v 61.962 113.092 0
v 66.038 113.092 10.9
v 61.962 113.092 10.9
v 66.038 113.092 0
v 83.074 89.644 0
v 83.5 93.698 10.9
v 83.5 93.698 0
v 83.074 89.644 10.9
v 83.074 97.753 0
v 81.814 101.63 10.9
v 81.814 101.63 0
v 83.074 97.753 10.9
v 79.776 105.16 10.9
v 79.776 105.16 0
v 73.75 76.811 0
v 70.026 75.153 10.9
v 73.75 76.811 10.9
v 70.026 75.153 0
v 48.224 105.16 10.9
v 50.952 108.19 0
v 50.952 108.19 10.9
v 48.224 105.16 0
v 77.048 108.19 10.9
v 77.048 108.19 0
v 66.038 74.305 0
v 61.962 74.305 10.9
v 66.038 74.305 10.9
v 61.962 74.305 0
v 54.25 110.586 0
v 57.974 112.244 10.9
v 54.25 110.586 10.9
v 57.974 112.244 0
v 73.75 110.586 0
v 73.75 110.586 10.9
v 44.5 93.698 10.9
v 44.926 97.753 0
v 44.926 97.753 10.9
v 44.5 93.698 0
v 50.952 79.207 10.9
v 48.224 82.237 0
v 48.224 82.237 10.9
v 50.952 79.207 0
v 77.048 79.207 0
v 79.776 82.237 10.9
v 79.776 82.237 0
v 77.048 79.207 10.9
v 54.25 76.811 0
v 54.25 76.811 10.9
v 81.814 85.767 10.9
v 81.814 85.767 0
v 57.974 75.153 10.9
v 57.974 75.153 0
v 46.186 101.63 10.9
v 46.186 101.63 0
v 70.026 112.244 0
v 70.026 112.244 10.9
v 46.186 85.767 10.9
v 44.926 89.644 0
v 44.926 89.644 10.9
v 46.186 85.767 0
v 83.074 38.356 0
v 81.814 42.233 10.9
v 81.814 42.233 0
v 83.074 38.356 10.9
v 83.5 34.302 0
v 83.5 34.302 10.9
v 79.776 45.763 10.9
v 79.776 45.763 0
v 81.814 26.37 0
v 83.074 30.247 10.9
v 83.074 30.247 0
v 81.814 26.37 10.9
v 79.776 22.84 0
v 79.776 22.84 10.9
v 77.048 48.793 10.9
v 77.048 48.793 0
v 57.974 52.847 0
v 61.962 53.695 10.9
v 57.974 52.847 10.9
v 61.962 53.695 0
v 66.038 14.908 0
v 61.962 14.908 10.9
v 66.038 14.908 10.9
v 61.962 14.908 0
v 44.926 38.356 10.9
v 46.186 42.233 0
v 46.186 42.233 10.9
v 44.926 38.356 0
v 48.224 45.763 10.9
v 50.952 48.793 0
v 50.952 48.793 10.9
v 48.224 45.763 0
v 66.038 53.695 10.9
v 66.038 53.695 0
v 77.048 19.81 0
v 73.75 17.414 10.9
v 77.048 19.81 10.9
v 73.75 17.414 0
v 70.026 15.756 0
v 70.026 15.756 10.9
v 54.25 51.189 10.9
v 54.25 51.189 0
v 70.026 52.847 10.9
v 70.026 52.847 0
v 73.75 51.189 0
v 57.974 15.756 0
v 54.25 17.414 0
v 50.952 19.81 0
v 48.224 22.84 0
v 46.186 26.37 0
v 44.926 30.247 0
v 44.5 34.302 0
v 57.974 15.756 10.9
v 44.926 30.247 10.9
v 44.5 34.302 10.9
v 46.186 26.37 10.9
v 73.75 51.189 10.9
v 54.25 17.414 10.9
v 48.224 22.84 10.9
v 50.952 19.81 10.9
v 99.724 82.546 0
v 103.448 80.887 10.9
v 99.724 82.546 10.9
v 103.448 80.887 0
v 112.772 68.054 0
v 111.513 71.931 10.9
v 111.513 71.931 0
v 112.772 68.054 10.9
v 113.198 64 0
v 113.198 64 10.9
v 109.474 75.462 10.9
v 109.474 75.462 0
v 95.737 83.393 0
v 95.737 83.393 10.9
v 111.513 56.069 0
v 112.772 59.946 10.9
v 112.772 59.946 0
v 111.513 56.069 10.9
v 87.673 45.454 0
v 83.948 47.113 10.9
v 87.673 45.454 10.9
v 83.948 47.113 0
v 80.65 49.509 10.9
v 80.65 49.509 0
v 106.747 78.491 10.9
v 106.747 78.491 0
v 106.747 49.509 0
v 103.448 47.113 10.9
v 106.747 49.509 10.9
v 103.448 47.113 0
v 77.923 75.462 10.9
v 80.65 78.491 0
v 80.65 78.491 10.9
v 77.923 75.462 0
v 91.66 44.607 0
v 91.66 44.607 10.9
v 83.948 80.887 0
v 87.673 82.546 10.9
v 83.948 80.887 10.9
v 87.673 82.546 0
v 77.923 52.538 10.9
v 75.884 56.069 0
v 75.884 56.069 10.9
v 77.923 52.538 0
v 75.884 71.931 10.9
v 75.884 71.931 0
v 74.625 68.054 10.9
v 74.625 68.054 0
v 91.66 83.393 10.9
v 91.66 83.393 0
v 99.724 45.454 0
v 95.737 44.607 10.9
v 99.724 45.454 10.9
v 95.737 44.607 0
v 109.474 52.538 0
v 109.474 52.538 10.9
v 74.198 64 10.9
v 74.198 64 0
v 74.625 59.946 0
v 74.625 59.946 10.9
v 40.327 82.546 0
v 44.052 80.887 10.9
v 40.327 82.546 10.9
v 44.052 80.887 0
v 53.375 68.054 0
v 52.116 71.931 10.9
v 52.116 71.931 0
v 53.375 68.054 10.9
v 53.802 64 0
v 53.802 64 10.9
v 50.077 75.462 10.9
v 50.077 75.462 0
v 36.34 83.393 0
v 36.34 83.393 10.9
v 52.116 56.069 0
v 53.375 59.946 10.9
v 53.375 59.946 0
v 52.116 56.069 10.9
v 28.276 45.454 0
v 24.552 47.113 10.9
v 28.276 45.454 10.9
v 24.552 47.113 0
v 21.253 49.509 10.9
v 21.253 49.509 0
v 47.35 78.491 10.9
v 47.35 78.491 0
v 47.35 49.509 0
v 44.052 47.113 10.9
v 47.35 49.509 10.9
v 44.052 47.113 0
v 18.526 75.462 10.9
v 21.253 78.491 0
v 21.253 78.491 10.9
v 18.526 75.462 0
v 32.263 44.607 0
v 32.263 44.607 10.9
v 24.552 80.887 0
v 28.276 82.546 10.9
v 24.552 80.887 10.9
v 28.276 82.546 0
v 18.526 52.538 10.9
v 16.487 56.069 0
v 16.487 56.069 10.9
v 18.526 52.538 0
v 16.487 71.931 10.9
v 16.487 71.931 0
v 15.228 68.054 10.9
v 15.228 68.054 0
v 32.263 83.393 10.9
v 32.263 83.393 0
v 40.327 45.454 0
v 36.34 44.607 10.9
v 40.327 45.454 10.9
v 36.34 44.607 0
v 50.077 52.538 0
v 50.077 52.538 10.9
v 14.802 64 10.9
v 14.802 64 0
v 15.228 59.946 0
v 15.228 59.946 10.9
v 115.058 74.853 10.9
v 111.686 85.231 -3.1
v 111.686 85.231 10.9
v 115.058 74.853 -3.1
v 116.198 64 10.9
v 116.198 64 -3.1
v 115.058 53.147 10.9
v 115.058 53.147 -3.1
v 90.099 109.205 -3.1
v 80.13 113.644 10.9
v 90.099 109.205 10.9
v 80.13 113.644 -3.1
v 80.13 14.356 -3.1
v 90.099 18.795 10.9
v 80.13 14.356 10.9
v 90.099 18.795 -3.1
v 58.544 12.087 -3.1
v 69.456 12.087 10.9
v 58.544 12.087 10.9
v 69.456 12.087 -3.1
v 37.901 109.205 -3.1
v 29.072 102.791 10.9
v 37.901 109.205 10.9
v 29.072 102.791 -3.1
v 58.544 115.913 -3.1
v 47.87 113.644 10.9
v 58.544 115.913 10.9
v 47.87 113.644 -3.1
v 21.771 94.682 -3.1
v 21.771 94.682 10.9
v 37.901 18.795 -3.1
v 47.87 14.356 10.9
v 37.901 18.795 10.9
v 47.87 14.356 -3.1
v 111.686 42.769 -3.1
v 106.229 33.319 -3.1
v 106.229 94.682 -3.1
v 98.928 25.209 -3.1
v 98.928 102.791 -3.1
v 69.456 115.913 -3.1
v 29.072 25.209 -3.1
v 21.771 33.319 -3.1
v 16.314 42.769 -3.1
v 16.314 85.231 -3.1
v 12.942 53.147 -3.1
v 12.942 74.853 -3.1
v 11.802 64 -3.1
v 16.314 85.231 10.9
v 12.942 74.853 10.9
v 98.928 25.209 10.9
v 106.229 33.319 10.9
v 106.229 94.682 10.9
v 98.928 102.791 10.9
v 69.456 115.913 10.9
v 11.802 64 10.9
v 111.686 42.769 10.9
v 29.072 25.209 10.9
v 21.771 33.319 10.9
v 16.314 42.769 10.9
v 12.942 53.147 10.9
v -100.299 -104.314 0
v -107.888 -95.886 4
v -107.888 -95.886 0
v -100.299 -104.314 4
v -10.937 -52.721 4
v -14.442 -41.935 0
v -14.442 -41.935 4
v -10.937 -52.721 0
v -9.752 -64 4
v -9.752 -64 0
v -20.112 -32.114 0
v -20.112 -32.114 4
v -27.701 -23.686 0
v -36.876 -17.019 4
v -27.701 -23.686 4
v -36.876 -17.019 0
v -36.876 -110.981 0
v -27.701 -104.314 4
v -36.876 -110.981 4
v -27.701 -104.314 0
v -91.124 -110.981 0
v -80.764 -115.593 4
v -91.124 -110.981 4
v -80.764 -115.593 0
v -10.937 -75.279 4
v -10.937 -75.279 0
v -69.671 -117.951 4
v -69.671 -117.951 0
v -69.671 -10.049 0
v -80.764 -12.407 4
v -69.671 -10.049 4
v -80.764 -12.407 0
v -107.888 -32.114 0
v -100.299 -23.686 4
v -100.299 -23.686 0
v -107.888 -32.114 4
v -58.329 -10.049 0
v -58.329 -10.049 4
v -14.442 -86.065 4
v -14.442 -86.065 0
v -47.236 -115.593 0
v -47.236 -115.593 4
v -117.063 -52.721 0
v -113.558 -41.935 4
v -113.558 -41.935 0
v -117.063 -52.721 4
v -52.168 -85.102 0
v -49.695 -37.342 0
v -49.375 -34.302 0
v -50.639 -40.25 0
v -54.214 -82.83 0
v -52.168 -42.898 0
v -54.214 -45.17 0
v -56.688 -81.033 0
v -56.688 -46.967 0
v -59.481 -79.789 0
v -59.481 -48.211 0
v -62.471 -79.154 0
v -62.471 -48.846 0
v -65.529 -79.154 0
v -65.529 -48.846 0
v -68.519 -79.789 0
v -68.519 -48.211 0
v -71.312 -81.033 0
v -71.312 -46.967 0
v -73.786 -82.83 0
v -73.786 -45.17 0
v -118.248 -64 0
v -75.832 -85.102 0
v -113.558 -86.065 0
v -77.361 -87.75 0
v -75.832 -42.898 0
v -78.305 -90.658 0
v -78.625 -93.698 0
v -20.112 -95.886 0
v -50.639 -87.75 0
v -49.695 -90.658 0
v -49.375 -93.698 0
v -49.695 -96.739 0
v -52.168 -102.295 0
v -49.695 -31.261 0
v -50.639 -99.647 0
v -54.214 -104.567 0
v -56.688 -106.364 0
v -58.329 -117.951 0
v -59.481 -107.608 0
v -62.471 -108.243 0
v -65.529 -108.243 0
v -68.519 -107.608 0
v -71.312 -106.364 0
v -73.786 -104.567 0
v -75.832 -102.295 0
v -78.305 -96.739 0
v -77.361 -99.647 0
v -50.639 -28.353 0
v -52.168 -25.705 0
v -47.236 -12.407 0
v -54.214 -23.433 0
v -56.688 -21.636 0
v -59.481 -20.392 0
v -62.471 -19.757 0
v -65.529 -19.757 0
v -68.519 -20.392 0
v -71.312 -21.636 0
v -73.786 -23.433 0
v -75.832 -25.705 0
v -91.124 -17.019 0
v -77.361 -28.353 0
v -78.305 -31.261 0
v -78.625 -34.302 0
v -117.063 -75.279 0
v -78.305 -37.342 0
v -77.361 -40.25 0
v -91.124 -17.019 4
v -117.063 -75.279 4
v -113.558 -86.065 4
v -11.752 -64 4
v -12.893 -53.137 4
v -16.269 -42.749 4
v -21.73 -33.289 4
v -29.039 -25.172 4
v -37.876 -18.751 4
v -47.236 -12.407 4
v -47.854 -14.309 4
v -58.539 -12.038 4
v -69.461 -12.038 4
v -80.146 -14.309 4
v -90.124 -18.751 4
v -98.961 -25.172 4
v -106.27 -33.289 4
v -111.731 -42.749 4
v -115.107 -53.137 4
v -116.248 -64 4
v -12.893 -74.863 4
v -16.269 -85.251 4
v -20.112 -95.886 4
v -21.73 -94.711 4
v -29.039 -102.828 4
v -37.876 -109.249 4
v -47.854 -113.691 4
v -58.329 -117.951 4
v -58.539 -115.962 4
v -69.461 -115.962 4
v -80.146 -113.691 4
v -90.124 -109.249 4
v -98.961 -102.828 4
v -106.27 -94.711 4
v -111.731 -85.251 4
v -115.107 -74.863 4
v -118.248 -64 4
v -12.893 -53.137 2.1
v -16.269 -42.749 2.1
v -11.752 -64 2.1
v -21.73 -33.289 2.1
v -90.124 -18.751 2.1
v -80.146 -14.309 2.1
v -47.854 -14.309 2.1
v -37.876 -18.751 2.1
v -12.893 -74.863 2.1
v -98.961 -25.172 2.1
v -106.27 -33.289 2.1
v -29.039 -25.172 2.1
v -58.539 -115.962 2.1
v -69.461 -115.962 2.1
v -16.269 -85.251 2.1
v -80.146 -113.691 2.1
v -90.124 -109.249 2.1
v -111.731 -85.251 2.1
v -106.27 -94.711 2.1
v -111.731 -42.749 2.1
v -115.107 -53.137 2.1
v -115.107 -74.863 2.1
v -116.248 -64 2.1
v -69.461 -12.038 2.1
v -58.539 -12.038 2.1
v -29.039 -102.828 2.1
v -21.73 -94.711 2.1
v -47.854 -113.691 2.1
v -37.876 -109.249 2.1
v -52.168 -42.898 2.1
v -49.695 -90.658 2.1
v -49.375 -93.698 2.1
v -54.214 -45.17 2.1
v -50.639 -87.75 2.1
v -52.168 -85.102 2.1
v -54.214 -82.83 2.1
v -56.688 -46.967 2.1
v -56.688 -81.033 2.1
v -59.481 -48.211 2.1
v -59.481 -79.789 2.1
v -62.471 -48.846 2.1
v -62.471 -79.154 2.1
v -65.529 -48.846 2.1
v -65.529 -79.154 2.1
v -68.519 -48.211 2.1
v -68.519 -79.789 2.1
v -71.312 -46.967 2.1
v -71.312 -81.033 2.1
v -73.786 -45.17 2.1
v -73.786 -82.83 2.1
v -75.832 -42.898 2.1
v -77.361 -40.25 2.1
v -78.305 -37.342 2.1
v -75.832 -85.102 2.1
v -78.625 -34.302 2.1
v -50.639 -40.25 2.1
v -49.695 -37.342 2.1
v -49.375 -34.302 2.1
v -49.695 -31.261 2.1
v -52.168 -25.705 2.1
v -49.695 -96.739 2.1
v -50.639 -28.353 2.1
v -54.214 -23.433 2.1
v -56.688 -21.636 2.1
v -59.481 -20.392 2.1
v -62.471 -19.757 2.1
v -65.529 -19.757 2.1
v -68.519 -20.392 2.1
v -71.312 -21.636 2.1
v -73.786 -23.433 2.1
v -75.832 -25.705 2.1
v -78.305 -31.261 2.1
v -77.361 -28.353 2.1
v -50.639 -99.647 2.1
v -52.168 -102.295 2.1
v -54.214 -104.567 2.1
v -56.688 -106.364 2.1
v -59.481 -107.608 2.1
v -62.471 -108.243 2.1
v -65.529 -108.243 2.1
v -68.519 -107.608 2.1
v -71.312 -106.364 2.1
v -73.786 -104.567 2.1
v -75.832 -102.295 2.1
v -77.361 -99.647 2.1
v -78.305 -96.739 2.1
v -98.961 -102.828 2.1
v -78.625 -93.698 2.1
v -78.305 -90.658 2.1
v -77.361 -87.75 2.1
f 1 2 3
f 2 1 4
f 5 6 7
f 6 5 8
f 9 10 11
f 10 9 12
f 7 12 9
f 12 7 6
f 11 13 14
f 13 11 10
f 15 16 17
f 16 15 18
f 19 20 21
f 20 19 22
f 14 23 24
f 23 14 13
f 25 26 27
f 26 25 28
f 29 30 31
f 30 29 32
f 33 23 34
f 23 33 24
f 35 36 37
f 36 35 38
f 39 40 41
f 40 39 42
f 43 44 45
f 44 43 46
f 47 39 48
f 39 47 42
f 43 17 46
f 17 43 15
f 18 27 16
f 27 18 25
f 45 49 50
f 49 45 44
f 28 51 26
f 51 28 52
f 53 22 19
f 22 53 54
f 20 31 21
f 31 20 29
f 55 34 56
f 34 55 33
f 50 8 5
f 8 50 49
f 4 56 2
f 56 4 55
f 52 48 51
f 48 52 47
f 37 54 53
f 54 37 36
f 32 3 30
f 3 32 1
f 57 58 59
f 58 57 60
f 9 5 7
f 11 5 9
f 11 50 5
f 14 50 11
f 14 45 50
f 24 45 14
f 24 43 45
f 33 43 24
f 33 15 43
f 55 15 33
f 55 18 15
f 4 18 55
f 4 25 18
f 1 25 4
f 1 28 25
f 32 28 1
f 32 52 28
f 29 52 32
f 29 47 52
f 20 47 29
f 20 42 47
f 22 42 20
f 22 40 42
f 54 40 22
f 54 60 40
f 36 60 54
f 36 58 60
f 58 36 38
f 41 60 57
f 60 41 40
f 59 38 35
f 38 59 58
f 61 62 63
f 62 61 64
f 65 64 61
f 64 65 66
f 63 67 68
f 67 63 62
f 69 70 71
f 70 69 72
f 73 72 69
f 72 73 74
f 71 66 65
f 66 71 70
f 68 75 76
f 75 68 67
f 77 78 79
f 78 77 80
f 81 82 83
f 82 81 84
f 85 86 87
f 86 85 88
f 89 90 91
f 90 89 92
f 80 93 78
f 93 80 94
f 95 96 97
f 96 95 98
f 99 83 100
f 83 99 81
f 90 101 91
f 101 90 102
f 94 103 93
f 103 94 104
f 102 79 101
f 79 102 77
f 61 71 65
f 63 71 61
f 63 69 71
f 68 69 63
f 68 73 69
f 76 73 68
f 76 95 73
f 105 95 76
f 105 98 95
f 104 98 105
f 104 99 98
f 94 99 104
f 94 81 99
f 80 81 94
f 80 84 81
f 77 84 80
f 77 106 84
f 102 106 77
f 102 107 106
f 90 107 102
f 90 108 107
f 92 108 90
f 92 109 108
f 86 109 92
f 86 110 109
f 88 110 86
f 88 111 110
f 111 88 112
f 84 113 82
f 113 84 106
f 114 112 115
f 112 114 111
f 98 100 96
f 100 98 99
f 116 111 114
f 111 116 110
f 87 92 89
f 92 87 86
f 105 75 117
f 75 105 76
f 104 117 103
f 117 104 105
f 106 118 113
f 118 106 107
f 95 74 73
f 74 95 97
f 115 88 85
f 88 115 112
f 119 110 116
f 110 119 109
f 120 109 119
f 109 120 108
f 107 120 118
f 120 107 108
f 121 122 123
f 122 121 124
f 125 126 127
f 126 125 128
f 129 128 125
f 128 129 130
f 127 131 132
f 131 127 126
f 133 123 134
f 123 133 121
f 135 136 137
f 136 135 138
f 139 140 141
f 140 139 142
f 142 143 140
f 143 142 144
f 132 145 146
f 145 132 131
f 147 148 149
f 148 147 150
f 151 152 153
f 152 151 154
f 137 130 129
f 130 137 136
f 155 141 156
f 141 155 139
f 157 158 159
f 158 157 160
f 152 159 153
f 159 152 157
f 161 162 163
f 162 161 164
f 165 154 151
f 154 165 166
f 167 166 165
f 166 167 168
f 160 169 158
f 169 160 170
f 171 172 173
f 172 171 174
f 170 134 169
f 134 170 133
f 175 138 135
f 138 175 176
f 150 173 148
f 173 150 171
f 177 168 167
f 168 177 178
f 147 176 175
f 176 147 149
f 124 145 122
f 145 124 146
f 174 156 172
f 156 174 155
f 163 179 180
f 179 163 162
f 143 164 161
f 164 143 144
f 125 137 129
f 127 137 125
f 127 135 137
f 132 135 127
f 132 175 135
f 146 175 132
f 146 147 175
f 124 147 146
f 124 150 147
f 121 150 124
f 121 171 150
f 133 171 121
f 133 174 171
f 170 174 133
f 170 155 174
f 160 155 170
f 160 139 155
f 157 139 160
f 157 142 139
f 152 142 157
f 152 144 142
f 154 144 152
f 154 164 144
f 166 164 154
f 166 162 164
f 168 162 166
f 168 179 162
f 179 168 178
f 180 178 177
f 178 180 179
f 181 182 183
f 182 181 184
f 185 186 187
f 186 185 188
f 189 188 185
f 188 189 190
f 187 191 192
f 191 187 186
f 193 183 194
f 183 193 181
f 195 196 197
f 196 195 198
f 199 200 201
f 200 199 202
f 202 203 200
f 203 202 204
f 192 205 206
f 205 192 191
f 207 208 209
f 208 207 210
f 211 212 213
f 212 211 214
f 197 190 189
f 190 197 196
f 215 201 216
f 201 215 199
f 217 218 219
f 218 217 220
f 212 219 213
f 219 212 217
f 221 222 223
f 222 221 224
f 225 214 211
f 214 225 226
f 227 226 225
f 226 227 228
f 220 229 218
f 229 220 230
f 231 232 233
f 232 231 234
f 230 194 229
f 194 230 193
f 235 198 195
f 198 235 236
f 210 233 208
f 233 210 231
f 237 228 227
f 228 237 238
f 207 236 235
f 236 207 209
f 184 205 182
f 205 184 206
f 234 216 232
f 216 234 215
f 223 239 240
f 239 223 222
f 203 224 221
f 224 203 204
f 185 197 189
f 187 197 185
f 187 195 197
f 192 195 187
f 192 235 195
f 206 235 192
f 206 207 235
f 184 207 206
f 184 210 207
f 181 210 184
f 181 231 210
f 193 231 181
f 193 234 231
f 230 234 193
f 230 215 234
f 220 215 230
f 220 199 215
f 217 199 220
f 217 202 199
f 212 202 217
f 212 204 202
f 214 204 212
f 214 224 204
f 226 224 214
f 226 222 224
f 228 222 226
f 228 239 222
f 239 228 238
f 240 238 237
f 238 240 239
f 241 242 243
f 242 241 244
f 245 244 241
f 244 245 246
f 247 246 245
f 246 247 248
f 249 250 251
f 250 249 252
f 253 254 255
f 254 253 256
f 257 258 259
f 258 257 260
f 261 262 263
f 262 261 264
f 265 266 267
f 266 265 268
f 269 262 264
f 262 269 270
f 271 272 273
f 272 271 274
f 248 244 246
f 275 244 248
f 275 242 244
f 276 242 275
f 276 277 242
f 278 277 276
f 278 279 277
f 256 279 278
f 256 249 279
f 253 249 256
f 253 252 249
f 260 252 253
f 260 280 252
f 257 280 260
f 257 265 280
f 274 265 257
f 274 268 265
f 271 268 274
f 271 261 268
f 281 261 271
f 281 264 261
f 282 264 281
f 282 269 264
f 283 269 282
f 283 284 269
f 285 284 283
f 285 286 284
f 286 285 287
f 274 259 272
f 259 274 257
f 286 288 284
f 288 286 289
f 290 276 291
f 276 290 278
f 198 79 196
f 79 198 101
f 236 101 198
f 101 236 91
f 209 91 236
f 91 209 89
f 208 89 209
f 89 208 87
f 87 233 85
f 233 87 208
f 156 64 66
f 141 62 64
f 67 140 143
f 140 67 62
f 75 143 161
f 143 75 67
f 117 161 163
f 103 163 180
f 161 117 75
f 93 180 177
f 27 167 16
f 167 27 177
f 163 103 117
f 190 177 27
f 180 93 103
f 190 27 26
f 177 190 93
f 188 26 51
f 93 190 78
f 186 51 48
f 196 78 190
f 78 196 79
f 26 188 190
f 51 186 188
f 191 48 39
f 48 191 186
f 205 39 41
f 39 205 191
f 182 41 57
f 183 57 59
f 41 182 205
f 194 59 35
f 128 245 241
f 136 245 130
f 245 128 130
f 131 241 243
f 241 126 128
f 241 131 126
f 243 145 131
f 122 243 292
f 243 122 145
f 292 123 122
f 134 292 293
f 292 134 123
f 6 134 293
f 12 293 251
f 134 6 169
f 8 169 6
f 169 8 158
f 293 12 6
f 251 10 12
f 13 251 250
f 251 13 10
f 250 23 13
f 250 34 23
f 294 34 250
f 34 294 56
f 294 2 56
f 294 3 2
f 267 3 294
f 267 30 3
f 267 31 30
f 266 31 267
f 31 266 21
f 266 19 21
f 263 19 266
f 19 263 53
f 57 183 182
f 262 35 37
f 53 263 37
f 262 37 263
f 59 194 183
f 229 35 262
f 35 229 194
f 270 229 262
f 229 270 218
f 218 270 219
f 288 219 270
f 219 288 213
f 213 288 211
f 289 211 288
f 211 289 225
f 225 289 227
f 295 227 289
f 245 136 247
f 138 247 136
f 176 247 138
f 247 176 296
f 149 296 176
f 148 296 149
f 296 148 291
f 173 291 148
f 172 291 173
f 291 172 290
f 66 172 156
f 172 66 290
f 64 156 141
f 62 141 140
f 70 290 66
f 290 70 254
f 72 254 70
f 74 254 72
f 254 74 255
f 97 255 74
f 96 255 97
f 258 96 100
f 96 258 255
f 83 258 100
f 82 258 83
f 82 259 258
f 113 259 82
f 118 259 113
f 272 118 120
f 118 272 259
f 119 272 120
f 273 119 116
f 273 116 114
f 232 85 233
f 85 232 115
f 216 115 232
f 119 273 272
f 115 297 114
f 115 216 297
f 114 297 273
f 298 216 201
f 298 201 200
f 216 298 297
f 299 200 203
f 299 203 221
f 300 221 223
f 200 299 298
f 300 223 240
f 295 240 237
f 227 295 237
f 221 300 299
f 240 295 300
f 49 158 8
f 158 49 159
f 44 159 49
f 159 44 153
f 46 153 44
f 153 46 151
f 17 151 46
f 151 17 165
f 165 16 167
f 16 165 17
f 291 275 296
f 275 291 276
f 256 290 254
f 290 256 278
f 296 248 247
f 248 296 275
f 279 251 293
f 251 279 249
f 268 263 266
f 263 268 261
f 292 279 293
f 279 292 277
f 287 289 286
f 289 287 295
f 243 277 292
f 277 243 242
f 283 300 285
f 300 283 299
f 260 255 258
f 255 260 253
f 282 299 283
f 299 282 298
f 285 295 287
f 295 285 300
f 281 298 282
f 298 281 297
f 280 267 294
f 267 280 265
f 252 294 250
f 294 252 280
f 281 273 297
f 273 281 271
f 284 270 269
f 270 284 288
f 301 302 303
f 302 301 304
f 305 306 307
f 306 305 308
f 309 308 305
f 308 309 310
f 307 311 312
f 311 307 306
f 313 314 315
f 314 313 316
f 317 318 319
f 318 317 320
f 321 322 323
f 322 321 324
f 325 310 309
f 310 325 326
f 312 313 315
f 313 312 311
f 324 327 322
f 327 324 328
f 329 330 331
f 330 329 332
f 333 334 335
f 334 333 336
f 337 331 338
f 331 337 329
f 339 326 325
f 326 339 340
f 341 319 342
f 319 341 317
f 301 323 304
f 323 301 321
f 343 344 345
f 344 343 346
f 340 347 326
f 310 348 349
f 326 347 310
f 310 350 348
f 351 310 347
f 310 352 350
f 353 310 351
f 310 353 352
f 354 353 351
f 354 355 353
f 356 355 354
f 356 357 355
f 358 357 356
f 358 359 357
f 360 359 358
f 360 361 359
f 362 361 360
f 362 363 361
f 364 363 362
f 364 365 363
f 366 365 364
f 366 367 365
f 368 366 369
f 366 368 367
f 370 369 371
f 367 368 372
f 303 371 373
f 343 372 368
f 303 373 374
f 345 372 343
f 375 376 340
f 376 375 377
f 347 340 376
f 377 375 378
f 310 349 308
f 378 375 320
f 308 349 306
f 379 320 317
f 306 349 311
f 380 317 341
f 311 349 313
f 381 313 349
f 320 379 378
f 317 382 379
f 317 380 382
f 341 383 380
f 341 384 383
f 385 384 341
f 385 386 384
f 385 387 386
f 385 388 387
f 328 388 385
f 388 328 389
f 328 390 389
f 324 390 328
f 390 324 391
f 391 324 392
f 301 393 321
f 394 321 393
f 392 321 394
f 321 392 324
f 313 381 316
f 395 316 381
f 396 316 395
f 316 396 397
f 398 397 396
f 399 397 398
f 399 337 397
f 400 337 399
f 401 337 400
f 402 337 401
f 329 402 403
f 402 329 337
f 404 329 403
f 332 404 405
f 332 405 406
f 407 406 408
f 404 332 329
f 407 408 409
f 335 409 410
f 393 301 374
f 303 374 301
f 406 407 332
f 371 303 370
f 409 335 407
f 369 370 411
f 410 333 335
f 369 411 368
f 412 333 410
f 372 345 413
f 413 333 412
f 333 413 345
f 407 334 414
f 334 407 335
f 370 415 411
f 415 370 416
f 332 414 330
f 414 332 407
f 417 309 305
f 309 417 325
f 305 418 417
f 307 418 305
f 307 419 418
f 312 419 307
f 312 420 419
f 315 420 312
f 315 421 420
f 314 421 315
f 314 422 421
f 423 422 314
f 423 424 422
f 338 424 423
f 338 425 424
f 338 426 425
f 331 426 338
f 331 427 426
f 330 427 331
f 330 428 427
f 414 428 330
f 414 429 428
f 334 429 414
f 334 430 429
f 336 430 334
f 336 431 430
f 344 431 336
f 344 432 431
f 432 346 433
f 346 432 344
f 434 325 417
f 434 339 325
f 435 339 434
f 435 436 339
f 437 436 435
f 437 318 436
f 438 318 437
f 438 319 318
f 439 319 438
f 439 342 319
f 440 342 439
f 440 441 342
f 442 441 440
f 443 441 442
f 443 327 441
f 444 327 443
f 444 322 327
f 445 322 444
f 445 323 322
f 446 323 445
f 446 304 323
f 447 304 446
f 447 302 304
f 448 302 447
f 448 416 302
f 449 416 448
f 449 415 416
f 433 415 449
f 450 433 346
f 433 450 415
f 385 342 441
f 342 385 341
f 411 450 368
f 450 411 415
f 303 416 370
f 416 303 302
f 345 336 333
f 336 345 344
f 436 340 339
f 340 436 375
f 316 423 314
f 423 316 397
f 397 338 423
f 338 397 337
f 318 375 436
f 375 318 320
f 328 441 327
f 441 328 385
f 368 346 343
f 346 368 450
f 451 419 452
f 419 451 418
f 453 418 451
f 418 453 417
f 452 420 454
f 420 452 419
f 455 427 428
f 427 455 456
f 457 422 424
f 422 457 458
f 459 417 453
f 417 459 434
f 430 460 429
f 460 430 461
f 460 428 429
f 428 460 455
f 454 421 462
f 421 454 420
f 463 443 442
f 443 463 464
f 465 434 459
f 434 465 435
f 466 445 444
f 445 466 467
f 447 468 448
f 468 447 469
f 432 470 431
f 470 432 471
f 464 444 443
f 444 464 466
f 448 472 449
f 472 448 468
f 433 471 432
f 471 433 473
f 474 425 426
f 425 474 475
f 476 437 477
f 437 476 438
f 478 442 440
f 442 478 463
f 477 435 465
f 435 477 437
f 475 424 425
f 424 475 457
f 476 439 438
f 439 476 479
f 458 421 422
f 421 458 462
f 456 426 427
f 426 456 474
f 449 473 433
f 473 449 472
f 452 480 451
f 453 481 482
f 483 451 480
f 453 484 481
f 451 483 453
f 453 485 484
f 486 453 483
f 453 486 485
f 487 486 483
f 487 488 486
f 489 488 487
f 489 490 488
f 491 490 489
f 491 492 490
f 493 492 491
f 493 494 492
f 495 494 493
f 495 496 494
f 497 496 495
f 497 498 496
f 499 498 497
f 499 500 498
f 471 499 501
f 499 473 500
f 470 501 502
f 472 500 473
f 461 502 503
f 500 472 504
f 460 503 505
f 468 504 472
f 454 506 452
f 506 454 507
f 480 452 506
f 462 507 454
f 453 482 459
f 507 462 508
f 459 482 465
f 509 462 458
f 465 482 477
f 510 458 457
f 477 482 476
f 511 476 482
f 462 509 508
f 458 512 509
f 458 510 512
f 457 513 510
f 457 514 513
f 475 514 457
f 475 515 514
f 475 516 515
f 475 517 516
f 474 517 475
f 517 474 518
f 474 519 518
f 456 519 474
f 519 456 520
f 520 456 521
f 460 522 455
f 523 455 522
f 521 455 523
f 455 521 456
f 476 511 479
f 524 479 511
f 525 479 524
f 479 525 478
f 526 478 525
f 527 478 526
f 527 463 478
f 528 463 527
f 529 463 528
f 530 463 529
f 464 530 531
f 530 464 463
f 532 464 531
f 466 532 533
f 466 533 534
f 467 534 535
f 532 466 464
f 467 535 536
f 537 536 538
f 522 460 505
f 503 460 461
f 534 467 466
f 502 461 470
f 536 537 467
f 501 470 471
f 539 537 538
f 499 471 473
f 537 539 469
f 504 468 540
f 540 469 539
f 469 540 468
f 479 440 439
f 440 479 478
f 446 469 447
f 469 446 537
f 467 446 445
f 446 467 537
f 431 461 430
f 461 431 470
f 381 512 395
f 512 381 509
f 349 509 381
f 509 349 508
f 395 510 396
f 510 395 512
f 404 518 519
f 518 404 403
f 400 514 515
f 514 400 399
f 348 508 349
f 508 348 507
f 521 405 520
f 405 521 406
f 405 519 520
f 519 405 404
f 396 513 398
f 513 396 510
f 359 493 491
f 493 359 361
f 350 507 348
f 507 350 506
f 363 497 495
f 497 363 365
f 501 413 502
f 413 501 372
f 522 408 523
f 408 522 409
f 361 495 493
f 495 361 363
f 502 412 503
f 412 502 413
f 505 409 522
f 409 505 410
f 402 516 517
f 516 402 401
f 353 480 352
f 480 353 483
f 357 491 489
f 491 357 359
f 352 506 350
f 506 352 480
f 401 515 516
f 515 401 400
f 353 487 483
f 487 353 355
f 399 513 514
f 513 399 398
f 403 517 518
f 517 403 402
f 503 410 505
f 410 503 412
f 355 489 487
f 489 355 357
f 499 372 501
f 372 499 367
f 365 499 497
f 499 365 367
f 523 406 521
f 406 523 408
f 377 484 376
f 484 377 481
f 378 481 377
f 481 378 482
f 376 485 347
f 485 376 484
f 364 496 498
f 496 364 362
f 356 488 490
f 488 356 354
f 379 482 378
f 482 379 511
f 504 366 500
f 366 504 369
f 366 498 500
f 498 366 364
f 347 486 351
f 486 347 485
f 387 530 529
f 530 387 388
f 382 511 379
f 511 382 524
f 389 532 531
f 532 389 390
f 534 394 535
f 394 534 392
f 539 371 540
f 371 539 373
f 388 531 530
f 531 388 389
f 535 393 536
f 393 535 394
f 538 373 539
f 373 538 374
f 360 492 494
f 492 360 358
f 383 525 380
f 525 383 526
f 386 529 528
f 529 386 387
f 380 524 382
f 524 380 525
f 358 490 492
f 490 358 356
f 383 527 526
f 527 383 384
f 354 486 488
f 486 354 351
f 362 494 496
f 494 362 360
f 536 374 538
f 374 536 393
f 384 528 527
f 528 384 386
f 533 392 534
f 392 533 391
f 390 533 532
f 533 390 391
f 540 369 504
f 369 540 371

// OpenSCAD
// dist units: mm

//whole config
parts_sep = 64; // how much to separate the top and base
eps =0.1; // nudge amount



//base config
well_dia = 39; // diameter of the food well. Currently set to contain a 3.5 cm petri dish & allow for a 3.8 cm cover to be added while in well
well_rad = well_dia/2; // r: radius of the food well
well_depth=11; // depth of the food well. Currently set to fit flush against the top of a 1.1 cm petri dish.
wall_thick = 3; // wt: wall thickness between wells
bottom_thick = wall_thick; // the thickness of the bottom of the disk

//top config
pit_dia = (2+2*sqrt(2.0))*well_rad + (2+sqrt(2.0))*wall_thick+ eps; // pd: size of the hole the base will fit into (ie, base diameter nudged)
lip_thick = 2; // lt: how far past the base does the lip extend?
lip_overhang = 2; // lo: how far down the base does the lip extend?
lid_thick = 2; // dt: how thick is the lid?
rad_cont = 0.75; // rc: how much smaller is the entry port than the well?


// define a well
module well(x,y,d,r){
     translate([x,y,0]) cylinder(r=r, h=d);//, center=true) ;
}

// define four evenly spaced wells
module allswell(d,r, wt){
    cntr = (r + wt/2)*sqrt(2.0); // calculate the centering coord
    well(0,cntr,d,r);
    well(0,-cntr,d,r);
    well(cntr,0,d,r);
    well(-cntr,0,d,r);
}

// define the Big Disk holding the wells
module metawell(d, r, wt, bt){

    translate([0,0,-(bt+eps)]) cylinder(d=(2+2*sqrt(2.0))*r + (2+sqrt(2.0))*wt , h=d+bt) ;

    }




//well(0,0,well_depth, well_rad);

//allswell(well_depth, well_rad, wall_thick);

//metawell(well_depth, well_rad, wall_thick, bottom_thick);

module allYourBase(d, r, wt, bt){
    difference(){
        metawell(d, r, wt, bt);
        allswell(d, r, wt);
    }    
}




translate([parts_sep,parts_sep,0]) allYourBase(well_depth, well_rad, wall_thick, bottom_thick);


module lid(pd,lo,lt,dt){
    cylinder(d=pd+2*lt, h=dt+lo);
    }
module pittedLid(pd,lo,lt,dt){
    difference(){
        lid(pd,lo,lt,dt);
        translate([0,0,dt+eps]) cylinder(d=pd, h=lo);
    }
}

//translate([-parts_sep,-parts_sep,0]) pittedLid(pit_dia, lip_overhang, lip_thick, lid_thick);

module punches(d,r, wt, rc){
    cntr = (r + wt/2)*sqrt(2.0); // calculate the centering coord
    well(0,cntr,d,r*rc);
    well(0,-cntr,d,r*rc);
}

//translate([-parts_sep,-parts_sep,0]) punches(lid_thick, well_rad*rad_cont, wall_thick);

module punchedPittedLid(pd,lo,lt,dt,r,rc,wt){
    difference(){
        pittedLid(pd, lo, lt, dt);
        translate([0,0,-0.9*eps]) punches(dt+2.1*eps, r, wt,rc);
    }
}

translate([-parts_sep,-parts_sep,0])  punchedPittedLid(pit_dia, lip_overhang, lip_thick, lid_thick, well_rad, rad_cont, wall_thick);
